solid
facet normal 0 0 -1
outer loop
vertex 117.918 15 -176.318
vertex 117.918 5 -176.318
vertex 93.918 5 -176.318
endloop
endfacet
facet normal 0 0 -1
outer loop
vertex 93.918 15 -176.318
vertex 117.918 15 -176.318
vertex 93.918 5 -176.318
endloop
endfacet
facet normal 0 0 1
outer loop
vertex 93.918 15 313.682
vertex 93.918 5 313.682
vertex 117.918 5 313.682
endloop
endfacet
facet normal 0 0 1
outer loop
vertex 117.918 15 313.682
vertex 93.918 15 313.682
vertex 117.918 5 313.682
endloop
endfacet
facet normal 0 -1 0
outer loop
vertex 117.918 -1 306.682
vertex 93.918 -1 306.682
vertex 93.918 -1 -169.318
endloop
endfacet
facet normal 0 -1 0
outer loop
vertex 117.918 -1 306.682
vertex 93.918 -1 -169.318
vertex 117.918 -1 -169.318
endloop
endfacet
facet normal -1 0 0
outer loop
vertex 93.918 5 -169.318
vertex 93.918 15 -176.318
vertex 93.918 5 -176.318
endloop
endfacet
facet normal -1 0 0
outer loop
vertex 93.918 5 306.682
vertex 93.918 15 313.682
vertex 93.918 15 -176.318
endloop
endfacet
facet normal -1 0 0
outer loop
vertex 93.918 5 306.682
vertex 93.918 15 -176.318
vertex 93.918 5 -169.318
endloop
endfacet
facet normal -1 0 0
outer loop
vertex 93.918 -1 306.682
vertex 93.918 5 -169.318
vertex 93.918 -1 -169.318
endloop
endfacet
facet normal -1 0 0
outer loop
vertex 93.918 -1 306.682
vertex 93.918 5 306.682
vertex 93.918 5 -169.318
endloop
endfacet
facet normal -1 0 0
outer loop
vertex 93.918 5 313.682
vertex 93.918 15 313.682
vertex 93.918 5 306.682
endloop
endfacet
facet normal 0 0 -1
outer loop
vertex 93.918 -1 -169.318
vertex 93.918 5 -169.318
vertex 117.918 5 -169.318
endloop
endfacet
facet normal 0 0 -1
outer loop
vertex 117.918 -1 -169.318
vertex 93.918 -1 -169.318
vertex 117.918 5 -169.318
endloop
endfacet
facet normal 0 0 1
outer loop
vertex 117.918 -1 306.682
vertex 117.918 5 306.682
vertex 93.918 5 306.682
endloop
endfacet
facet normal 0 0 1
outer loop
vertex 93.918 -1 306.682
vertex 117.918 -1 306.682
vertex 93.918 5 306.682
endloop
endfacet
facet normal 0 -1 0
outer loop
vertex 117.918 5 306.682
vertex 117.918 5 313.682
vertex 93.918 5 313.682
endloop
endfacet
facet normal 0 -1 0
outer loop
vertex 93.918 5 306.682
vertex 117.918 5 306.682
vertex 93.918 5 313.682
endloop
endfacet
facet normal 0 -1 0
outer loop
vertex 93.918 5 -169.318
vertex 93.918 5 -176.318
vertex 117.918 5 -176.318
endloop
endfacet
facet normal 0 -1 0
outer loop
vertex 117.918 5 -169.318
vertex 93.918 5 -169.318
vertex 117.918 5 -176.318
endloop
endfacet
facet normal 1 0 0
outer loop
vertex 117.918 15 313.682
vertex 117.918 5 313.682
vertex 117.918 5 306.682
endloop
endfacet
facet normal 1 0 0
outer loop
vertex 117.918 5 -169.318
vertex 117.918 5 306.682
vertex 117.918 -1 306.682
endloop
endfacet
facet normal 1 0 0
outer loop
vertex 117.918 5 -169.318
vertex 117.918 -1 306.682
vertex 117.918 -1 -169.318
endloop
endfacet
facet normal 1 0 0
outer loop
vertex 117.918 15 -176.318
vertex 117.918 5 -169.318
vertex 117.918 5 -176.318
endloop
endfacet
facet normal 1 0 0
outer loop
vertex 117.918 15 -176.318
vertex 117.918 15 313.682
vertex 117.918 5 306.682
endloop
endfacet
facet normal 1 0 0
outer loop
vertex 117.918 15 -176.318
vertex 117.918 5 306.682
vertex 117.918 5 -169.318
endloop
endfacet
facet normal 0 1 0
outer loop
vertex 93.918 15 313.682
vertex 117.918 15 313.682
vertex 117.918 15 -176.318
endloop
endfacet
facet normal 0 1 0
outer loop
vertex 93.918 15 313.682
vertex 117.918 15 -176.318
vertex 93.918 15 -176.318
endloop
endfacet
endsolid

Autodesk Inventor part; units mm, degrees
ref_plane "YZ Plane" through (0, 0, 0) normal (1, 0, 0) x (0, 1, 0)
ref_plane "XZ Plane" through (0, 0, 0) normal (0, 1, 0) x (-1, 0, 0)
ref_plane "XY Plane" through (0, 0, 0) normal (0, 0, 1) x (1, 0, 0)
sketch "Sketch1" plane through (0, 0, 0) normal (0, 1, 0) x (-1, 0, 0)
  line L0 (-92.9183, 313.6817) -> (-117.9183, 313.6817)
  line L1 (-117.9183, 313.6817) -> (-117.9183, -176.3183)
  line L2 (-117.9183, -176.3183) -> (-92.9183, -176.3183)
  line L3 (-92.9183, -176.3183) -> (-92.9183, 313.6817)
  point P0 (0, 0)
  dimension "d0" = 25
  dimension "d1" = 490
extrude "Extrusion1" add sketch "Sketch1" along normal blind 15
sketch "Sketch2" plane through (92.9183, 0, 313.6817) normal (0, 0, 1) x (1, 0, 0)
  line L0 (25, 0) -> (0, 0) projected
  line L1 (0, 0) -> (25, 0)
  line L2 (25, 0) -> (25, 5)
  line L3 (25, 5) -> (0, 5)
  line L4 (0, 5) -> (0, 0)
  point P0 (-92.9183, 0)
  dimension "d4" = 25
  dimension "d5" = 5
extrude "Extrusion2" cut sketch "Sketch2" against normal blind 7
sketch "Sketch3" plane through (117.9183, 0, -176.3183) normal (0, 0, -1) x (-1, 0, 0)
  line L0 (0, 0) -> (25, 0) projected
  line L1 (0, 0) -> (25, 0)
  line L2 (25, 0) -> (25, 5)
  line L3 (25, 5) -> (0, 5)
  line L4 (0, 5) -> (0, 0)
  point P0 (117.9183, 0)
  dimension "d8" = 25
  dimension "d9" = 5
extrude "Extrusion3" cut sketch "Sketch3" against normal blind 7
sketch "Sketch4" plane through (0, 0, 0) normal (0, -1, 0) x (1, 0, 0)
  line L0 (117.9183, 313.6817) -> (117.9183, -176.3183) projected
  line L1 (92.9183, -169.3183) -> (117.9183, -169.3183) projected
  line L2 (117.9183, 306.6817) -> (117.9183, -169.3183) projected
  line L3 (117.9183, 306.6817) -> (92.9183, 306.6817) projected
  line L4 (92.9183, -169.3183) -> (92.9183, 306.6817) projected
  line L5 (92.9183, -169.3183) -> (92.9183, 306.6817) projected
  line L6 (117.9183, 306.6817) -> (117.9183, -169.3183) projected
  line L7 (92.9183, -169.3183) -> (117.9183, -169.3183)
  line L8 (117.9183, -169.3183) -> (117.9183, 306.6817)
  line L9 (117.9183, 306.6817) -> (92.9183, 306.6817)
  line L10 (92.9183, 306.6817) -> (92.9183, -169.3183)
  point P0 (0, 0)
extrude "Extrusion4" add sketch "Sketch4" along normal blind 1
sketch "Sketch5" plane through (92.9183, 15, 313.6817) normal (0, 0, 1) x (1, 0, 0)
  line L0 (0, -10) -> (0, 0) projected
  line L1 (25, -16) -> (0, -16) projected
  line L2 (0, 0) -> (1, 0)
  line L3 (1, 0) -> (1, -16)
  line L4 (1, -16) -> (0, -16)
  line L5 (0, -16) -> (0, 0)
  point P0 (-92.9183, -15)
  dimension "d14" = 1
extrude "Extrusion5" cut sketch "Sketch5" against normal through all
properties part number "Arcade_TopFill"
